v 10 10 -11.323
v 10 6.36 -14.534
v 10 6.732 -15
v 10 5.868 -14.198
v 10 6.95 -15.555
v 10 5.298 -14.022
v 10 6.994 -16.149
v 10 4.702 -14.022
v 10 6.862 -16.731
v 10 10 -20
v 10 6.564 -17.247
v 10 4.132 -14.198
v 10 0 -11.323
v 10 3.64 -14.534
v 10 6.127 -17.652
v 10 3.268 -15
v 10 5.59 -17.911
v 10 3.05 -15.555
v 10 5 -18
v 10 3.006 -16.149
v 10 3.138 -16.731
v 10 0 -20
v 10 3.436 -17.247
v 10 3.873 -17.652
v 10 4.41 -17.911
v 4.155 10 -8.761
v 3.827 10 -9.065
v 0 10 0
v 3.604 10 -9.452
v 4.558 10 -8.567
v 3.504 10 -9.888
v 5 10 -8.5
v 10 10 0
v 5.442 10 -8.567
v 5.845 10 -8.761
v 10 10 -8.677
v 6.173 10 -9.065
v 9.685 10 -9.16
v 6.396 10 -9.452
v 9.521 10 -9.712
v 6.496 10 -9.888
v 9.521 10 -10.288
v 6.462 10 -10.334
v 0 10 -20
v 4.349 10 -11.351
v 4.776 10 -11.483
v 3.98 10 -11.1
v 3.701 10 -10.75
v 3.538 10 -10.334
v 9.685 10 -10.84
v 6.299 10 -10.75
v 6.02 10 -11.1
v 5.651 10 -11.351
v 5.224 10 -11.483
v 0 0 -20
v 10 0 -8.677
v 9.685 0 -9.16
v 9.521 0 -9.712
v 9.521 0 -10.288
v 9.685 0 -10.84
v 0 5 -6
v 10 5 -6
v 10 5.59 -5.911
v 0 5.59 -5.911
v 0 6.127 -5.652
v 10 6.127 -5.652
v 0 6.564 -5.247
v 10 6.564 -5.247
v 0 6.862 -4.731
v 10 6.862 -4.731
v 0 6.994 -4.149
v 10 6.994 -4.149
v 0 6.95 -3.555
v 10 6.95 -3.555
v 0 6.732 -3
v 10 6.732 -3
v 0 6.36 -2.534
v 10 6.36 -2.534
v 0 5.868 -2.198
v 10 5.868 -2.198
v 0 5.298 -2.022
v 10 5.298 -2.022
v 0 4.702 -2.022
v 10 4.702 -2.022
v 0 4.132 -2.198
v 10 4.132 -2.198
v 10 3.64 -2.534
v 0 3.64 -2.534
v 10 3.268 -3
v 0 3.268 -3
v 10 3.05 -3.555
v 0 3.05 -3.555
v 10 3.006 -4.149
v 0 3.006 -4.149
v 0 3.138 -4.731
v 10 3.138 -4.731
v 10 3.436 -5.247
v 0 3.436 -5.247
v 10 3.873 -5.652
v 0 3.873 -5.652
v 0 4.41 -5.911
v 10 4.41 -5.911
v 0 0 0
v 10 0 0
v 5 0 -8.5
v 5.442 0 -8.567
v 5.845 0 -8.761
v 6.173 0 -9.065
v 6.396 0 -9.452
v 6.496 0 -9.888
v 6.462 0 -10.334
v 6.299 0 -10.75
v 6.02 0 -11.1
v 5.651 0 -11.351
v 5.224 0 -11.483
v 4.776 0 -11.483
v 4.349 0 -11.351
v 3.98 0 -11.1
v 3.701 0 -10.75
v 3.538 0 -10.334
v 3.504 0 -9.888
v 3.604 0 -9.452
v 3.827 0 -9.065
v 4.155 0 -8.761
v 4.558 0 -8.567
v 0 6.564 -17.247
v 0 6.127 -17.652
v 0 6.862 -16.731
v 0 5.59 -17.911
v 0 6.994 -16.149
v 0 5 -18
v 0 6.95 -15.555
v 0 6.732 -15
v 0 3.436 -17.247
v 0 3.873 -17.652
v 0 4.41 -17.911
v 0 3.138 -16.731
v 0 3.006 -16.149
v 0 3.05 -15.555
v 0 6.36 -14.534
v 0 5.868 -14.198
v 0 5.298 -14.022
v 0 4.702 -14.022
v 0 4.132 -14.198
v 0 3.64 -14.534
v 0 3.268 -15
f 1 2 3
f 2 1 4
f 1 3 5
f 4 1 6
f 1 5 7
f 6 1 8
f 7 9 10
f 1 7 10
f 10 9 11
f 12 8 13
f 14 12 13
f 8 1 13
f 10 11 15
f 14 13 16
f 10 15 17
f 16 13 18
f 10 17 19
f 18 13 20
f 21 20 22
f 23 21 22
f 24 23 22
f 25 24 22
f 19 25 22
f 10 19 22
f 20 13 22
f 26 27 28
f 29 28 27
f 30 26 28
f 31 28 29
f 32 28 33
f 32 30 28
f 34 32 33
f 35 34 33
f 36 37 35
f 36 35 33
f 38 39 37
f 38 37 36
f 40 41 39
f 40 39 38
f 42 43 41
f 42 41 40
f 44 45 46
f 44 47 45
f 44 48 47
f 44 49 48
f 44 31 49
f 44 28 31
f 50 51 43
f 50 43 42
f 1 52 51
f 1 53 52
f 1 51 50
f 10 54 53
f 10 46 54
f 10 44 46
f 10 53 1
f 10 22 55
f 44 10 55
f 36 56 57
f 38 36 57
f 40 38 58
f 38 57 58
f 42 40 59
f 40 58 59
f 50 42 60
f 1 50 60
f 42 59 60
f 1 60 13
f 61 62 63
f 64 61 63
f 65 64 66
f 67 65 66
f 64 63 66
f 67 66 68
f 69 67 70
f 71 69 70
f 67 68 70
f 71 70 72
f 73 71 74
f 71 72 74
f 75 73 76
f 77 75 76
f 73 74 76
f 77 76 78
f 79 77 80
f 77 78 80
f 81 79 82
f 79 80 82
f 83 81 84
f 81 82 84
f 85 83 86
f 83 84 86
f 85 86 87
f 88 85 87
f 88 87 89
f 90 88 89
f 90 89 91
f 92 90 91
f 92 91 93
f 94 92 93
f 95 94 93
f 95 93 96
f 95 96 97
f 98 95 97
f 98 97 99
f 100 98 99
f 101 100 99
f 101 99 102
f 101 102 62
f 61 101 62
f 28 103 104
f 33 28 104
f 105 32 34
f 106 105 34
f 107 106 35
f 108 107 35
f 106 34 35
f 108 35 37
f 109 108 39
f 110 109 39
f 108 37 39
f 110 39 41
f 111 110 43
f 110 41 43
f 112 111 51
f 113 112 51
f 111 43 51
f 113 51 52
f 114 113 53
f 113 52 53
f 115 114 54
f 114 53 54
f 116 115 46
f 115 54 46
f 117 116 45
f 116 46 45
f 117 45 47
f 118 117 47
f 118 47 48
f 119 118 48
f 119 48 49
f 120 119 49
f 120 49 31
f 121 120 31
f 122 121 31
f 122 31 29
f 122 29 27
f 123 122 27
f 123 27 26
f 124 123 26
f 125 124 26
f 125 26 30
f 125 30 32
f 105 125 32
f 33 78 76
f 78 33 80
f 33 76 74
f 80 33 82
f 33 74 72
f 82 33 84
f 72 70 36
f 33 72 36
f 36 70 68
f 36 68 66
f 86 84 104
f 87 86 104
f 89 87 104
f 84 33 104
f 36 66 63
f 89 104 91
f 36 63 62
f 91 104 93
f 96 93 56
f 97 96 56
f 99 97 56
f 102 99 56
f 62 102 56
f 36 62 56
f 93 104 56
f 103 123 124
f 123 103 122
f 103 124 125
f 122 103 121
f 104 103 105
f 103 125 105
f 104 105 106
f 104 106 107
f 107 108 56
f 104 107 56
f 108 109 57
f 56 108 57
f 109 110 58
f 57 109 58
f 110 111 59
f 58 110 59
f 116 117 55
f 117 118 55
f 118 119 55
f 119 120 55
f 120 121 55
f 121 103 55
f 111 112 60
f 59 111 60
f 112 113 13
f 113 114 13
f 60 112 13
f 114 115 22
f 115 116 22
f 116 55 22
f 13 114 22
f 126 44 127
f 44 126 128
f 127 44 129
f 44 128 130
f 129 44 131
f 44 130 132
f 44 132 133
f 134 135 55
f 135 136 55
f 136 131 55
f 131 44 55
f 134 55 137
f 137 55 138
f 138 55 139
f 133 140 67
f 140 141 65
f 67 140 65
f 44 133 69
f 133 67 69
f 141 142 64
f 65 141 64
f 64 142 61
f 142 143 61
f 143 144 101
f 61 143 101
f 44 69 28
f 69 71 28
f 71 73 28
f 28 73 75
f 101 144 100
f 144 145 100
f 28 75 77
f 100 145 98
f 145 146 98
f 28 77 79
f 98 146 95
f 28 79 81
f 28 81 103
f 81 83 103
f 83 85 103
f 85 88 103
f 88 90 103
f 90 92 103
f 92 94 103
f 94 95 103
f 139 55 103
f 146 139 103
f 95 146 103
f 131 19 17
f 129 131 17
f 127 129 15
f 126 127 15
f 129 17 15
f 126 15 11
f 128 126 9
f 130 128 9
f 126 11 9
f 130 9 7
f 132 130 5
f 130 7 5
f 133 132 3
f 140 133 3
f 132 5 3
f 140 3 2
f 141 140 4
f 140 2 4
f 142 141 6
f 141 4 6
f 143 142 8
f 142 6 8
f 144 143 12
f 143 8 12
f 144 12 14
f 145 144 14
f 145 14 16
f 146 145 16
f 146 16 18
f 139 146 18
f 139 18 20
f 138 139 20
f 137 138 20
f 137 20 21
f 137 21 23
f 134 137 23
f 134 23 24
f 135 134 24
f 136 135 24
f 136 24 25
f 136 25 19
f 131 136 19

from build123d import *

# Parameters (mm, degrees)
BOSS_EXTRUDE1_DEPTH = 10
SKETCH2_R           = 2
CUT_EXTRUDE1_DEPTH  = 19
SKETCH3_R           = 1.5
CUT_EXTRUDE2_DEPTH  = 18


with BuildPart() as part:
    # Sketch1 → Boss-Extrude1 (new body)
    with BuildSketch(Plane(origin=(0, 0, 0), x_dir=(1, 0, 0), z_dir=(0, 1, 0))):
        with BuildLine():
            Line((0, 20), (0, 0))
            Line((0, 0), (10, 0))
            Line((10, 0), (10, 8.677124344))
            ThreePointArc((10, 8.677124344), (9.5, 10), (10, 11.322875656))
            Line((10, 11.322875656), (10, 20))
            Line((10, 20), (0, 20))
        make_face()
    extrude(amount=BOSS_EXTRUDE1_DEPTH)

    # Sketch2 → Cut-Extrude1 (cut)
    with BuildSketch(Plane(origin=(10, 0, 0), x_dir=(0, 0, -1), z_dir=(1, 0, 0))):
        with Locations((4, 5)):
            Circle(SKETCH2_R)
        with Locations((16, 5)):
            Circle(SKETCH2_R)
    extrude(amount=-CUT_EXTRUDE1_DEPTH, mode=Mode.SUBTRACT)

    # Sketch3 → Cut-Extrude2 (cut)
    with BuildSketch(Plane(origin=(0, 10, 0), x_dir=(1, 0, 0), z_dir=(0, 1, 0))):
        with Locations(Location((5, 10, 0), (0, 0, 270))):
            Circle(SKETCH3_R)
    extrude(amount=-CUT_EXTRUDE2_DEPTH, mode=Mode.SUBTRACT)


solid = part.part
